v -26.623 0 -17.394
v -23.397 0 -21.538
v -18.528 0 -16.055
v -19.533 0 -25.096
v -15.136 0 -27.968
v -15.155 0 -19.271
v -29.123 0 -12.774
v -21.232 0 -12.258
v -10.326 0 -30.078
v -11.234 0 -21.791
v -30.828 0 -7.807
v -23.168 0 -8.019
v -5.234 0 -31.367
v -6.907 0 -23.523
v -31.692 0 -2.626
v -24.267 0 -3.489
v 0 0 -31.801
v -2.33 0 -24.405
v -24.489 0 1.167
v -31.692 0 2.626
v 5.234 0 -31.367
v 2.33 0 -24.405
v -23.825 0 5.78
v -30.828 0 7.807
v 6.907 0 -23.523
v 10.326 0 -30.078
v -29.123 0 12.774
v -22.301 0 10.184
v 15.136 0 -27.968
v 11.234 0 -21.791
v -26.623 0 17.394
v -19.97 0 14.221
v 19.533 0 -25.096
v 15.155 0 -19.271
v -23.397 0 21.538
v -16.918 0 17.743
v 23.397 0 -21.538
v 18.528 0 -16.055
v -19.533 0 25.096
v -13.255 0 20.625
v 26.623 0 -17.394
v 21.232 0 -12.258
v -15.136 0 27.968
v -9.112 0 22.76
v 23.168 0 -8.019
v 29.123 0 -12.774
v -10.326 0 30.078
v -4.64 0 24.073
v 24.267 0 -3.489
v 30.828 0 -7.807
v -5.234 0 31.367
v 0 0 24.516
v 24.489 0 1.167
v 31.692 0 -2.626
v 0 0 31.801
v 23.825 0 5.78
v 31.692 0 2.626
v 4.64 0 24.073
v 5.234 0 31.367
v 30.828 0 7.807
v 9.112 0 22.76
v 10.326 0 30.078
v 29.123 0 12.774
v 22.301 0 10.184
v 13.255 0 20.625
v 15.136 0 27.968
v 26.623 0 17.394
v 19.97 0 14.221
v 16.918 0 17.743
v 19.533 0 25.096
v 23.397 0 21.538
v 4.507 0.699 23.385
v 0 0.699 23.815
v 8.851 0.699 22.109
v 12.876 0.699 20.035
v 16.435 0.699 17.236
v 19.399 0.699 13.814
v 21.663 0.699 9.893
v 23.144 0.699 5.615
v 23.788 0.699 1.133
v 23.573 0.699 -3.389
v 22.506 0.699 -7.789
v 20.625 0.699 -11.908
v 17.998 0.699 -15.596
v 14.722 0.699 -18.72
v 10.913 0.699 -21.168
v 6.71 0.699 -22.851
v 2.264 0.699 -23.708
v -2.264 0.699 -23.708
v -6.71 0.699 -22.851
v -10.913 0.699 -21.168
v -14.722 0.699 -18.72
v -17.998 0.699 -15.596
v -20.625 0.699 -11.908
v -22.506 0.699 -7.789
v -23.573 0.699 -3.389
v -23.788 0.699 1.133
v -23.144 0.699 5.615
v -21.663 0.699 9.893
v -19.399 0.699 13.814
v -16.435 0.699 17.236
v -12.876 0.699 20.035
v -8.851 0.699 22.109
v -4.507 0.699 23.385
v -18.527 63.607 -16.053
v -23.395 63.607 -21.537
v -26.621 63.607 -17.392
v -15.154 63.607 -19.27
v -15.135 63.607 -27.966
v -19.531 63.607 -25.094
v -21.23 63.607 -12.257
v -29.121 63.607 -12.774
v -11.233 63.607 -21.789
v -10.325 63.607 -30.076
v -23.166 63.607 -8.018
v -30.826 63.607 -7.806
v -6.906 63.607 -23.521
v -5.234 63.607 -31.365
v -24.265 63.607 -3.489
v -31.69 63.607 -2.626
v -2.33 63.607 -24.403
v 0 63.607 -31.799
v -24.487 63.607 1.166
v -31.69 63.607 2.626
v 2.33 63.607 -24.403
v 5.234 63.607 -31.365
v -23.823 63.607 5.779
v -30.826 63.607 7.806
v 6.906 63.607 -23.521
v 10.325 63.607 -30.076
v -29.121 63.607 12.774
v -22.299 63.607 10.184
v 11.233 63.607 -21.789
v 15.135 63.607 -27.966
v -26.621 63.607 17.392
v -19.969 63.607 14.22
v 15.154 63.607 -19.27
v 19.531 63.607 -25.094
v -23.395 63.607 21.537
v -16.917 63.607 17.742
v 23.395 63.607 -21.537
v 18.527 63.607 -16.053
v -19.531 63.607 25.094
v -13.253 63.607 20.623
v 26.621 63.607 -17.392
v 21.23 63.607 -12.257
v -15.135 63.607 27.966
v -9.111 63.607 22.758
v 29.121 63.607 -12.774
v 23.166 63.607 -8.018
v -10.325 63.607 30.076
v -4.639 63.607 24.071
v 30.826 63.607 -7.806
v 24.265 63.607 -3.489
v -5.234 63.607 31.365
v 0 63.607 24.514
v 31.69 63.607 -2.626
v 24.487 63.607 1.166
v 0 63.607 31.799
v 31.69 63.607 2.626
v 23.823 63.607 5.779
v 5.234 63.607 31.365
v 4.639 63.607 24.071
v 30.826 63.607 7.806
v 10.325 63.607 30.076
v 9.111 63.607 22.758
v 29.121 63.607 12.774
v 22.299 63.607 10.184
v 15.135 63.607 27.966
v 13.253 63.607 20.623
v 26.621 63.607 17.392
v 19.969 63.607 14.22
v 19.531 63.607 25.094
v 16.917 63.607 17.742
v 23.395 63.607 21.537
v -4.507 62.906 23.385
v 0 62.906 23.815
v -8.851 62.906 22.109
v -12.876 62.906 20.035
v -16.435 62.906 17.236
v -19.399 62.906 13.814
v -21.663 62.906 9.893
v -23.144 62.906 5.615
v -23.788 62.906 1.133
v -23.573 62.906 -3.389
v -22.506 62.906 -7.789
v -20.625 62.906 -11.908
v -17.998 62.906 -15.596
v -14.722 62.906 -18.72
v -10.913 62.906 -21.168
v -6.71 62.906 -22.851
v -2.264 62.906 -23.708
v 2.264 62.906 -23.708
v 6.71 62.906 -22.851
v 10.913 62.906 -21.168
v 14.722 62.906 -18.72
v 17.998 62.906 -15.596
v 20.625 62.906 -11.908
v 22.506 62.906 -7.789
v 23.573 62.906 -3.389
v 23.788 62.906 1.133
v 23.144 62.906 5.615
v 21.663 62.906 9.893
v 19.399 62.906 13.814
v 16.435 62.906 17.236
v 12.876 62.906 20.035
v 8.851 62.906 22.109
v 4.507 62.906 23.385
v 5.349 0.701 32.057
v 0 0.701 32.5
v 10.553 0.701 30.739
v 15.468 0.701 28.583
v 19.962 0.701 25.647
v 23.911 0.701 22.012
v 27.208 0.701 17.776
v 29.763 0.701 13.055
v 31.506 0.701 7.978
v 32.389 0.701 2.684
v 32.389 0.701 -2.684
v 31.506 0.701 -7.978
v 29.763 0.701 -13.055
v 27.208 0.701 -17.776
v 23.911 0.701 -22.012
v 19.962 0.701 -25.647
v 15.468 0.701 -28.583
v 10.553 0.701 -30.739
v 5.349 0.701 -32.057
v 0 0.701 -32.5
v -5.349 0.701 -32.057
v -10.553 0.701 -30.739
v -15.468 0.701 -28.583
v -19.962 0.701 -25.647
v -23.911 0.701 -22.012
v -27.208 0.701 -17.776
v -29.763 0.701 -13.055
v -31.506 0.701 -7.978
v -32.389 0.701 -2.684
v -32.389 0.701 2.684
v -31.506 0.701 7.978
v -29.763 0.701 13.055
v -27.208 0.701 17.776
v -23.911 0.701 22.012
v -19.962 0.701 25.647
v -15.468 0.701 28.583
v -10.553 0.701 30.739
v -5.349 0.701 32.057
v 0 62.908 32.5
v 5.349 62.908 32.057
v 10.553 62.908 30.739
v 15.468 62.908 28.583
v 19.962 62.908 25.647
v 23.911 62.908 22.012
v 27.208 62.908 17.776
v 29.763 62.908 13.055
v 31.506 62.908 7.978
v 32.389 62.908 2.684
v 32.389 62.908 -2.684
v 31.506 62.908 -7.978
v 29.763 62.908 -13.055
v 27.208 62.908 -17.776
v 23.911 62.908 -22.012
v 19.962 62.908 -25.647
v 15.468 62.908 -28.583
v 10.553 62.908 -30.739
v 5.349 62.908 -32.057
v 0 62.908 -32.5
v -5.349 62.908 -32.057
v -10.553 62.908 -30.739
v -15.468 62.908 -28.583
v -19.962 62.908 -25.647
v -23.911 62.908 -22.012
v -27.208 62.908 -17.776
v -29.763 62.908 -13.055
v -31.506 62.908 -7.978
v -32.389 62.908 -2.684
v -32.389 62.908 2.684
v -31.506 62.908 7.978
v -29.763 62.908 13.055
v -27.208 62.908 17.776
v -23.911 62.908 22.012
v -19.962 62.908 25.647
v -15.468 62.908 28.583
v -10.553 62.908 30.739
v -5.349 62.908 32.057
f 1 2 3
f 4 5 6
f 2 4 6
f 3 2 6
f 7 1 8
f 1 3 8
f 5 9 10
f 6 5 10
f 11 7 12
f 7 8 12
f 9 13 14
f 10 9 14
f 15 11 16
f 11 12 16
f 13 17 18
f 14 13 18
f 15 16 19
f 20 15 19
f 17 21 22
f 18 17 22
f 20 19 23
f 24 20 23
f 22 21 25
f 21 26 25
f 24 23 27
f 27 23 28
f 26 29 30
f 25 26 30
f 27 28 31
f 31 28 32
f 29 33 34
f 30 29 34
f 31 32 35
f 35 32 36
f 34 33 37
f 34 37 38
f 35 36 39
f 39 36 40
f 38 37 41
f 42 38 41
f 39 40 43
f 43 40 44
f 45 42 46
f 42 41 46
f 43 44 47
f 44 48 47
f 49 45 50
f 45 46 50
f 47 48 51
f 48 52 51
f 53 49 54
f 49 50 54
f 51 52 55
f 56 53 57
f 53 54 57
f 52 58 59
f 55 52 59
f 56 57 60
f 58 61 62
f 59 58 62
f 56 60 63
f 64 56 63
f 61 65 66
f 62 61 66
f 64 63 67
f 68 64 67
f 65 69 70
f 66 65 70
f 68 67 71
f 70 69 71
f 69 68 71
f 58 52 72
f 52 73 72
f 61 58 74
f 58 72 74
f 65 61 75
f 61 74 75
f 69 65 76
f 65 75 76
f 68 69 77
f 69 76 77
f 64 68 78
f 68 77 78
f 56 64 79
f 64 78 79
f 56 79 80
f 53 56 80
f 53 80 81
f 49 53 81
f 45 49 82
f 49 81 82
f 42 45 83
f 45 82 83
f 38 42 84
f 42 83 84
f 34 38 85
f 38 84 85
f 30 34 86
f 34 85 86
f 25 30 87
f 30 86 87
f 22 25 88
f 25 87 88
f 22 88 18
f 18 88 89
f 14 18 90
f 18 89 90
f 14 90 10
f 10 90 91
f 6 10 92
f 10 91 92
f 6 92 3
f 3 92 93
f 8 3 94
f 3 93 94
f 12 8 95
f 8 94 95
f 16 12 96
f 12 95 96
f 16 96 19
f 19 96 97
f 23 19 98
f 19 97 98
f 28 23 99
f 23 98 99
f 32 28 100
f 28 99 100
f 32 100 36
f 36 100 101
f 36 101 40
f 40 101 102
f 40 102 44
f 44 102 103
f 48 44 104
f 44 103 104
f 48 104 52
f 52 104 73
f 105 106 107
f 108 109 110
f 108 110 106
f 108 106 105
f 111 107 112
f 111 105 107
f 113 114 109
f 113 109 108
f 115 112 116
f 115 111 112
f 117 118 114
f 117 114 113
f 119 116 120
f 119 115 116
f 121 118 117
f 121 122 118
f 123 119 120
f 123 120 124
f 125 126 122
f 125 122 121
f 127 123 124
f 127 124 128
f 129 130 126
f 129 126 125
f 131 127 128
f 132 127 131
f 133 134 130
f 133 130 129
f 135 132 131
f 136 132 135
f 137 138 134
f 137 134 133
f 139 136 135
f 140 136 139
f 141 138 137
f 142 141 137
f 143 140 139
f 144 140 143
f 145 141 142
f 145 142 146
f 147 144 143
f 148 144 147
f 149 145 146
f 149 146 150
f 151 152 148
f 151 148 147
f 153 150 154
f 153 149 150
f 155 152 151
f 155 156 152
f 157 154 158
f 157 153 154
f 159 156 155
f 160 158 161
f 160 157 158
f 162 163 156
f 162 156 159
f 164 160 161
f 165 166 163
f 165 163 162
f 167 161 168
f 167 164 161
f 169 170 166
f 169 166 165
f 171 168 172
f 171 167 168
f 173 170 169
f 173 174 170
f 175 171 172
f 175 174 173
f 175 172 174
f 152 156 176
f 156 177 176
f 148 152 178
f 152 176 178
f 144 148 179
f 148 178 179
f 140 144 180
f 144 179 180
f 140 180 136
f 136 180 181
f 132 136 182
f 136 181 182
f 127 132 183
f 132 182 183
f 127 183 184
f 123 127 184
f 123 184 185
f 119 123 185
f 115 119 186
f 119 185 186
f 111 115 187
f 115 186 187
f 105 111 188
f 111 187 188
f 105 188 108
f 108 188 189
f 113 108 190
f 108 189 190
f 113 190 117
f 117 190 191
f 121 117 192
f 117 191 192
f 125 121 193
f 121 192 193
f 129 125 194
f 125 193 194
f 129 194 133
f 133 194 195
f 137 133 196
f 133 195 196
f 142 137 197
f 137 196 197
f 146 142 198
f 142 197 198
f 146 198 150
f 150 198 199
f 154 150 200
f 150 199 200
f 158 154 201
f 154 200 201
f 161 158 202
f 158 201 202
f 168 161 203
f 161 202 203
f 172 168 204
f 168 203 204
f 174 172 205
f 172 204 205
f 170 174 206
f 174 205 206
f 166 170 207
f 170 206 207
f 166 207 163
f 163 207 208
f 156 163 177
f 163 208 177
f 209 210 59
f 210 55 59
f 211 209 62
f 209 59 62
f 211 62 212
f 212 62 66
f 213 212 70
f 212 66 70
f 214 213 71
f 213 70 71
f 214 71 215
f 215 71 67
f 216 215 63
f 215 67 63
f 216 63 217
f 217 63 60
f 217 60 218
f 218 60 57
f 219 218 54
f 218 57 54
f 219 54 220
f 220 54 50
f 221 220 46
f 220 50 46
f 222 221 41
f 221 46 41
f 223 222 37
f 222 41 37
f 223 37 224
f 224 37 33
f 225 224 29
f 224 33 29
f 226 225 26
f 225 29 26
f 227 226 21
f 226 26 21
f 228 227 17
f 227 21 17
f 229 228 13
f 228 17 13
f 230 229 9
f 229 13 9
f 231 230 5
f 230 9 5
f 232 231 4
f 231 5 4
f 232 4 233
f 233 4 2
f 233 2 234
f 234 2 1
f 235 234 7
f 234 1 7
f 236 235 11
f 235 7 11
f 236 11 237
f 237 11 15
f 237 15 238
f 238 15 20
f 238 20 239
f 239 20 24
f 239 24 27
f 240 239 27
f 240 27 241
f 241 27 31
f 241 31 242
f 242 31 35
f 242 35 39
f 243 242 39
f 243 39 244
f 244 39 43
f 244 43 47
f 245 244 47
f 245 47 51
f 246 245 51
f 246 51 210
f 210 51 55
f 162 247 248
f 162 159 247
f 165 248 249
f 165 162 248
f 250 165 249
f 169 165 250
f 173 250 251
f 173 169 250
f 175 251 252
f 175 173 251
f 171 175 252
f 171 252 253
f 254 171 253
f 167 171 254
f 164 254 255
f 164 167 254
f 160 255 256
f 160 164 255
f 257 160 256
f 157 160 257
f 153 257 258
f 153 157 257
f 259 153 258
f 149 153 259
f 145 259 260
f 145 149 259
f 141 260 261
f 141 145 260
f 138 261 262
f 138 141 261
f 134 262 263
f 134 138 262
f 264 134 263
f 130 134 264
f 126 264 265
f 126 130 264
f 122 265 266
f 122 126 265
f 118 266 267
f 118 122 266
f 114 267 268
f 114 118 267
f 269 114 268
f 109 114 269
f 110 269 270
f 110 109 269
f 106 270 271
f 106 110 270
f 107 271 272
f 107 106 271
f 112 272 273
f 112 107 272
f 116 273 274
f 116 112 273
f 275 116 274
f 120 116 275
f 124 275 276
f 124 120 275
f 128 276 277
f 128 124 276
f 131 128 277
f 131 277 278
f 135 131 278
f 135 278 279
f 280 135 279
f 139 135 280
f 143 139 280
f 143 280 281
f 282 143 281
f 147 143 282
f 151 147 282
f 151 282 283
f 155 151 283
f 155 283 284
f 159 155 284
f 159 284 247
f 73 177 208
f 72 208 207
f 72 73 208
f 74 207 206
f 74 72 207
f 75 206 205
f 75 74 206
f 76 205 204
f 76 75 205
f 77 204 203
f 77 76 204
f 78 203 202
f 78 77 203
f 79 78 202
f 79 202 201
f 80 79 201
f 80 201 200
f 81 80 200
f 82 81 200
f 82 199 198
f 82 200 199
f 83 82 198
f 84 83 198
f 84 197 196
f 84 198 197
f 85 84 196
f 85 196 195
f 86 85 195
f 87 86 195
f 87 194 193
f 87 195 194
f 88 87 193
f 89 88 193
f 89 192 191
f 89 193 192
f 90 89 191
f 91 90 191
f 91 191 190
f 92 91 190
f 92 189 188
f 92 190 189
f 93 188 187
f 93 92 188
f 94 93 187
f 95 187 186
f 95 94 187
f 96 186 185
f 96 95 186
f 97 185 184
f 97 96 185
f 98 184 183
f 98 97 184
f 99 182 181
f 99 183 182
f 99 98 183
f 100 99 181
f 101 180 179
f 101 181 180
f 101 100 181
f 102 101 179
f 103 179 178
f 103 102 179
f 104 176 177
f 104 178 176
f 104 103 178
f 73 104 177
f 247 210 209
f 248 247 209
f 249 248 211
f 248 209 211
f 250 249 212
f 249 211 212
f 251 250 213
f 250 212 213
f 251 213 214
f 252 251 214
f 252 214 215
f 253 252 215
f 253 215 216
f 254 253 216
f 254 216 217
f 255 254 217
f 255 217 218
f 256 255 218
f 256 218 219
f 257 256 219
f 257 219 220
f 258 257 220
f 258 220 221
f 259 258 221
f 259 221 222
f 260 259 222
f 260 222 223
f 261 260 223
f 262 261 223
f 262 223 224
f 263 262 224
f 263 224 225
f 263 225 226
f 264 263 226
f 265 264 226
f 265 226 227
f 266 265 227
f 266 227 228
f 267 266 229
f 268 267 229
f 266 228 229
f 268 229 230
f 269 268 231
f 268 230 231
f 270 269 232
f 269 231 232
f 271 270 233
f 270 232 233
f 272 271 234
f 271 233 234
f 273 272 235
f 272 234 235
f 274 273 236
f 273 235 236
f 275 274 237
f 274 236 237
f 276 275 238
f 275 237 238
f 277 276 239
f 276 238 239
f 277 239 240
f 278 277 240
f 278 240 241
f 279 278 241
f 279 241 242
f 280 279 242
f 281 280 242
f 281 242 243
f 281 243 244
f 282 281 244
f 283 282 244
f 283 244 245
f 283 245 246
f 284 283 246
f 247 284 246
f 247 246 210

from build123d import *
from OCP.BRepFilletAPI import BRepFilletAPI_MakeChamfer

# Parameters (mm, degrees)
SKETCH1_R           = 32.5
BOSS_EXTRUDE1_DEPTH = 63.607411149
SKETCH2_R           = 23.815414931
CUT_EXTRUDE1_DEPTH  = 79.475491417
CHAMFER1_SIZE       = 0.69891071
CHAMFER1_SIZE2      = 0.701009985


with BuildPart() as part:
    # Sketch1 → Boss-Extrude1 (new body)
    with BuildSketch(Plane(origin=(0, 0, 0), x_dir=(1, 0, 0), z_dir=(0, 1, 0))):
        Circle(SKETCH1_R)
    extrude(amount=BOSS_EXTRUDE1_DEPTH)

    # Sketch2 → Cut-Extrude1 (cut, through all)
    with BuildSketch(Plane(origin=(0, 0, 0), x_dir=(1, 0, 0), z_dir=(0, 1, 0))):
        Circle(SKETCH2_R)
    extrude(amount=CUT_EXTRUDE1_DEPTH, mode=Mode.SUBTRACT)

    # Chamfer1: one chamfer whose edges measure the first distance from different faces: ONE call of the kernel's chamfer builder (chamfer() names one face for all edges)
    chamfer1_edges_1 = [part.edges().sort_by_distance(p)[0] for p in [
        (-23.815414931, 63.607411149, 0),
    ]]
    chamfer1_side_1 = [part.faces().sort_by_distance(p)[0] for p in [
        (-31.580761184, 63.607411149, 0),
    ]]
    chamfer1_edges_2 = [part.edges().sort_by_distance(p)[0] for p in [
        (-23.815414931, 0, 0),
    ]]
    chamfer1_side_2 = [part.faces().sort_by_distance(p)[0] for p in [
        (-23.815414931, 31.803705575, 0),
    ]]
    chamfer1_edges_3 = [part.edges().sort_by_distance(p)[0] for p in [
        (-32.5, 0, 0),
    ]]
    chamfer1_side_3 = [part.faces().sort_by_distance(p)[0] for p in [
        (-31.580761184, 0, 0),
    ]]
    chamfer1_edges_4 = [part.edges().sort_by_distance(p)[0] for p in [
        (-32.5, 63.607411149, 0),
    ]]
    chamfer1_side_4 = [part.faces().sort_by_distance(p)[0] for p in [
        (-32.5, 31.803705575, 0),
    ]]
    chamfer1 = BRepFilletAPI_MakeChamfer(part.part.solid().wrapped)
    for e in chamfer1_edges_1:
        chamfer1.Add(CHAMFER1_SIZE, CHAMFER1_SIZE2, e.wrapped, chamfer1_side_1[0].wrapped)  # the first distance lies on this face
    for e in chamfer1_edges_2:
        chamfer1.Add(CHAMFER1_SIZE, CHAMFER1_SIZE2, e.wrapped, chamfer1_side_2[0].wrapped)  # the first distance lies on this face
    for e in chamfer1_edges_3:
        chamfer1.Add(CHAMFER1_SIZE, CHAMFER1_SIZE2, e.wrapped, chamfer1_side_3[0].wrapped)  # the first distance lies on this face
    for e in chamfer1_edges_4:
        chamfer1.Add(CHAMFER1_SIZE, CHAMFER1_SIZE2, e.wrapped, chamfer1_side_4[0].wrapped)  # the first distance lies on this face
    add(Compound.cast(chamfer1.Shape()), mode=Mode.REPLACE)


solid = part.part
